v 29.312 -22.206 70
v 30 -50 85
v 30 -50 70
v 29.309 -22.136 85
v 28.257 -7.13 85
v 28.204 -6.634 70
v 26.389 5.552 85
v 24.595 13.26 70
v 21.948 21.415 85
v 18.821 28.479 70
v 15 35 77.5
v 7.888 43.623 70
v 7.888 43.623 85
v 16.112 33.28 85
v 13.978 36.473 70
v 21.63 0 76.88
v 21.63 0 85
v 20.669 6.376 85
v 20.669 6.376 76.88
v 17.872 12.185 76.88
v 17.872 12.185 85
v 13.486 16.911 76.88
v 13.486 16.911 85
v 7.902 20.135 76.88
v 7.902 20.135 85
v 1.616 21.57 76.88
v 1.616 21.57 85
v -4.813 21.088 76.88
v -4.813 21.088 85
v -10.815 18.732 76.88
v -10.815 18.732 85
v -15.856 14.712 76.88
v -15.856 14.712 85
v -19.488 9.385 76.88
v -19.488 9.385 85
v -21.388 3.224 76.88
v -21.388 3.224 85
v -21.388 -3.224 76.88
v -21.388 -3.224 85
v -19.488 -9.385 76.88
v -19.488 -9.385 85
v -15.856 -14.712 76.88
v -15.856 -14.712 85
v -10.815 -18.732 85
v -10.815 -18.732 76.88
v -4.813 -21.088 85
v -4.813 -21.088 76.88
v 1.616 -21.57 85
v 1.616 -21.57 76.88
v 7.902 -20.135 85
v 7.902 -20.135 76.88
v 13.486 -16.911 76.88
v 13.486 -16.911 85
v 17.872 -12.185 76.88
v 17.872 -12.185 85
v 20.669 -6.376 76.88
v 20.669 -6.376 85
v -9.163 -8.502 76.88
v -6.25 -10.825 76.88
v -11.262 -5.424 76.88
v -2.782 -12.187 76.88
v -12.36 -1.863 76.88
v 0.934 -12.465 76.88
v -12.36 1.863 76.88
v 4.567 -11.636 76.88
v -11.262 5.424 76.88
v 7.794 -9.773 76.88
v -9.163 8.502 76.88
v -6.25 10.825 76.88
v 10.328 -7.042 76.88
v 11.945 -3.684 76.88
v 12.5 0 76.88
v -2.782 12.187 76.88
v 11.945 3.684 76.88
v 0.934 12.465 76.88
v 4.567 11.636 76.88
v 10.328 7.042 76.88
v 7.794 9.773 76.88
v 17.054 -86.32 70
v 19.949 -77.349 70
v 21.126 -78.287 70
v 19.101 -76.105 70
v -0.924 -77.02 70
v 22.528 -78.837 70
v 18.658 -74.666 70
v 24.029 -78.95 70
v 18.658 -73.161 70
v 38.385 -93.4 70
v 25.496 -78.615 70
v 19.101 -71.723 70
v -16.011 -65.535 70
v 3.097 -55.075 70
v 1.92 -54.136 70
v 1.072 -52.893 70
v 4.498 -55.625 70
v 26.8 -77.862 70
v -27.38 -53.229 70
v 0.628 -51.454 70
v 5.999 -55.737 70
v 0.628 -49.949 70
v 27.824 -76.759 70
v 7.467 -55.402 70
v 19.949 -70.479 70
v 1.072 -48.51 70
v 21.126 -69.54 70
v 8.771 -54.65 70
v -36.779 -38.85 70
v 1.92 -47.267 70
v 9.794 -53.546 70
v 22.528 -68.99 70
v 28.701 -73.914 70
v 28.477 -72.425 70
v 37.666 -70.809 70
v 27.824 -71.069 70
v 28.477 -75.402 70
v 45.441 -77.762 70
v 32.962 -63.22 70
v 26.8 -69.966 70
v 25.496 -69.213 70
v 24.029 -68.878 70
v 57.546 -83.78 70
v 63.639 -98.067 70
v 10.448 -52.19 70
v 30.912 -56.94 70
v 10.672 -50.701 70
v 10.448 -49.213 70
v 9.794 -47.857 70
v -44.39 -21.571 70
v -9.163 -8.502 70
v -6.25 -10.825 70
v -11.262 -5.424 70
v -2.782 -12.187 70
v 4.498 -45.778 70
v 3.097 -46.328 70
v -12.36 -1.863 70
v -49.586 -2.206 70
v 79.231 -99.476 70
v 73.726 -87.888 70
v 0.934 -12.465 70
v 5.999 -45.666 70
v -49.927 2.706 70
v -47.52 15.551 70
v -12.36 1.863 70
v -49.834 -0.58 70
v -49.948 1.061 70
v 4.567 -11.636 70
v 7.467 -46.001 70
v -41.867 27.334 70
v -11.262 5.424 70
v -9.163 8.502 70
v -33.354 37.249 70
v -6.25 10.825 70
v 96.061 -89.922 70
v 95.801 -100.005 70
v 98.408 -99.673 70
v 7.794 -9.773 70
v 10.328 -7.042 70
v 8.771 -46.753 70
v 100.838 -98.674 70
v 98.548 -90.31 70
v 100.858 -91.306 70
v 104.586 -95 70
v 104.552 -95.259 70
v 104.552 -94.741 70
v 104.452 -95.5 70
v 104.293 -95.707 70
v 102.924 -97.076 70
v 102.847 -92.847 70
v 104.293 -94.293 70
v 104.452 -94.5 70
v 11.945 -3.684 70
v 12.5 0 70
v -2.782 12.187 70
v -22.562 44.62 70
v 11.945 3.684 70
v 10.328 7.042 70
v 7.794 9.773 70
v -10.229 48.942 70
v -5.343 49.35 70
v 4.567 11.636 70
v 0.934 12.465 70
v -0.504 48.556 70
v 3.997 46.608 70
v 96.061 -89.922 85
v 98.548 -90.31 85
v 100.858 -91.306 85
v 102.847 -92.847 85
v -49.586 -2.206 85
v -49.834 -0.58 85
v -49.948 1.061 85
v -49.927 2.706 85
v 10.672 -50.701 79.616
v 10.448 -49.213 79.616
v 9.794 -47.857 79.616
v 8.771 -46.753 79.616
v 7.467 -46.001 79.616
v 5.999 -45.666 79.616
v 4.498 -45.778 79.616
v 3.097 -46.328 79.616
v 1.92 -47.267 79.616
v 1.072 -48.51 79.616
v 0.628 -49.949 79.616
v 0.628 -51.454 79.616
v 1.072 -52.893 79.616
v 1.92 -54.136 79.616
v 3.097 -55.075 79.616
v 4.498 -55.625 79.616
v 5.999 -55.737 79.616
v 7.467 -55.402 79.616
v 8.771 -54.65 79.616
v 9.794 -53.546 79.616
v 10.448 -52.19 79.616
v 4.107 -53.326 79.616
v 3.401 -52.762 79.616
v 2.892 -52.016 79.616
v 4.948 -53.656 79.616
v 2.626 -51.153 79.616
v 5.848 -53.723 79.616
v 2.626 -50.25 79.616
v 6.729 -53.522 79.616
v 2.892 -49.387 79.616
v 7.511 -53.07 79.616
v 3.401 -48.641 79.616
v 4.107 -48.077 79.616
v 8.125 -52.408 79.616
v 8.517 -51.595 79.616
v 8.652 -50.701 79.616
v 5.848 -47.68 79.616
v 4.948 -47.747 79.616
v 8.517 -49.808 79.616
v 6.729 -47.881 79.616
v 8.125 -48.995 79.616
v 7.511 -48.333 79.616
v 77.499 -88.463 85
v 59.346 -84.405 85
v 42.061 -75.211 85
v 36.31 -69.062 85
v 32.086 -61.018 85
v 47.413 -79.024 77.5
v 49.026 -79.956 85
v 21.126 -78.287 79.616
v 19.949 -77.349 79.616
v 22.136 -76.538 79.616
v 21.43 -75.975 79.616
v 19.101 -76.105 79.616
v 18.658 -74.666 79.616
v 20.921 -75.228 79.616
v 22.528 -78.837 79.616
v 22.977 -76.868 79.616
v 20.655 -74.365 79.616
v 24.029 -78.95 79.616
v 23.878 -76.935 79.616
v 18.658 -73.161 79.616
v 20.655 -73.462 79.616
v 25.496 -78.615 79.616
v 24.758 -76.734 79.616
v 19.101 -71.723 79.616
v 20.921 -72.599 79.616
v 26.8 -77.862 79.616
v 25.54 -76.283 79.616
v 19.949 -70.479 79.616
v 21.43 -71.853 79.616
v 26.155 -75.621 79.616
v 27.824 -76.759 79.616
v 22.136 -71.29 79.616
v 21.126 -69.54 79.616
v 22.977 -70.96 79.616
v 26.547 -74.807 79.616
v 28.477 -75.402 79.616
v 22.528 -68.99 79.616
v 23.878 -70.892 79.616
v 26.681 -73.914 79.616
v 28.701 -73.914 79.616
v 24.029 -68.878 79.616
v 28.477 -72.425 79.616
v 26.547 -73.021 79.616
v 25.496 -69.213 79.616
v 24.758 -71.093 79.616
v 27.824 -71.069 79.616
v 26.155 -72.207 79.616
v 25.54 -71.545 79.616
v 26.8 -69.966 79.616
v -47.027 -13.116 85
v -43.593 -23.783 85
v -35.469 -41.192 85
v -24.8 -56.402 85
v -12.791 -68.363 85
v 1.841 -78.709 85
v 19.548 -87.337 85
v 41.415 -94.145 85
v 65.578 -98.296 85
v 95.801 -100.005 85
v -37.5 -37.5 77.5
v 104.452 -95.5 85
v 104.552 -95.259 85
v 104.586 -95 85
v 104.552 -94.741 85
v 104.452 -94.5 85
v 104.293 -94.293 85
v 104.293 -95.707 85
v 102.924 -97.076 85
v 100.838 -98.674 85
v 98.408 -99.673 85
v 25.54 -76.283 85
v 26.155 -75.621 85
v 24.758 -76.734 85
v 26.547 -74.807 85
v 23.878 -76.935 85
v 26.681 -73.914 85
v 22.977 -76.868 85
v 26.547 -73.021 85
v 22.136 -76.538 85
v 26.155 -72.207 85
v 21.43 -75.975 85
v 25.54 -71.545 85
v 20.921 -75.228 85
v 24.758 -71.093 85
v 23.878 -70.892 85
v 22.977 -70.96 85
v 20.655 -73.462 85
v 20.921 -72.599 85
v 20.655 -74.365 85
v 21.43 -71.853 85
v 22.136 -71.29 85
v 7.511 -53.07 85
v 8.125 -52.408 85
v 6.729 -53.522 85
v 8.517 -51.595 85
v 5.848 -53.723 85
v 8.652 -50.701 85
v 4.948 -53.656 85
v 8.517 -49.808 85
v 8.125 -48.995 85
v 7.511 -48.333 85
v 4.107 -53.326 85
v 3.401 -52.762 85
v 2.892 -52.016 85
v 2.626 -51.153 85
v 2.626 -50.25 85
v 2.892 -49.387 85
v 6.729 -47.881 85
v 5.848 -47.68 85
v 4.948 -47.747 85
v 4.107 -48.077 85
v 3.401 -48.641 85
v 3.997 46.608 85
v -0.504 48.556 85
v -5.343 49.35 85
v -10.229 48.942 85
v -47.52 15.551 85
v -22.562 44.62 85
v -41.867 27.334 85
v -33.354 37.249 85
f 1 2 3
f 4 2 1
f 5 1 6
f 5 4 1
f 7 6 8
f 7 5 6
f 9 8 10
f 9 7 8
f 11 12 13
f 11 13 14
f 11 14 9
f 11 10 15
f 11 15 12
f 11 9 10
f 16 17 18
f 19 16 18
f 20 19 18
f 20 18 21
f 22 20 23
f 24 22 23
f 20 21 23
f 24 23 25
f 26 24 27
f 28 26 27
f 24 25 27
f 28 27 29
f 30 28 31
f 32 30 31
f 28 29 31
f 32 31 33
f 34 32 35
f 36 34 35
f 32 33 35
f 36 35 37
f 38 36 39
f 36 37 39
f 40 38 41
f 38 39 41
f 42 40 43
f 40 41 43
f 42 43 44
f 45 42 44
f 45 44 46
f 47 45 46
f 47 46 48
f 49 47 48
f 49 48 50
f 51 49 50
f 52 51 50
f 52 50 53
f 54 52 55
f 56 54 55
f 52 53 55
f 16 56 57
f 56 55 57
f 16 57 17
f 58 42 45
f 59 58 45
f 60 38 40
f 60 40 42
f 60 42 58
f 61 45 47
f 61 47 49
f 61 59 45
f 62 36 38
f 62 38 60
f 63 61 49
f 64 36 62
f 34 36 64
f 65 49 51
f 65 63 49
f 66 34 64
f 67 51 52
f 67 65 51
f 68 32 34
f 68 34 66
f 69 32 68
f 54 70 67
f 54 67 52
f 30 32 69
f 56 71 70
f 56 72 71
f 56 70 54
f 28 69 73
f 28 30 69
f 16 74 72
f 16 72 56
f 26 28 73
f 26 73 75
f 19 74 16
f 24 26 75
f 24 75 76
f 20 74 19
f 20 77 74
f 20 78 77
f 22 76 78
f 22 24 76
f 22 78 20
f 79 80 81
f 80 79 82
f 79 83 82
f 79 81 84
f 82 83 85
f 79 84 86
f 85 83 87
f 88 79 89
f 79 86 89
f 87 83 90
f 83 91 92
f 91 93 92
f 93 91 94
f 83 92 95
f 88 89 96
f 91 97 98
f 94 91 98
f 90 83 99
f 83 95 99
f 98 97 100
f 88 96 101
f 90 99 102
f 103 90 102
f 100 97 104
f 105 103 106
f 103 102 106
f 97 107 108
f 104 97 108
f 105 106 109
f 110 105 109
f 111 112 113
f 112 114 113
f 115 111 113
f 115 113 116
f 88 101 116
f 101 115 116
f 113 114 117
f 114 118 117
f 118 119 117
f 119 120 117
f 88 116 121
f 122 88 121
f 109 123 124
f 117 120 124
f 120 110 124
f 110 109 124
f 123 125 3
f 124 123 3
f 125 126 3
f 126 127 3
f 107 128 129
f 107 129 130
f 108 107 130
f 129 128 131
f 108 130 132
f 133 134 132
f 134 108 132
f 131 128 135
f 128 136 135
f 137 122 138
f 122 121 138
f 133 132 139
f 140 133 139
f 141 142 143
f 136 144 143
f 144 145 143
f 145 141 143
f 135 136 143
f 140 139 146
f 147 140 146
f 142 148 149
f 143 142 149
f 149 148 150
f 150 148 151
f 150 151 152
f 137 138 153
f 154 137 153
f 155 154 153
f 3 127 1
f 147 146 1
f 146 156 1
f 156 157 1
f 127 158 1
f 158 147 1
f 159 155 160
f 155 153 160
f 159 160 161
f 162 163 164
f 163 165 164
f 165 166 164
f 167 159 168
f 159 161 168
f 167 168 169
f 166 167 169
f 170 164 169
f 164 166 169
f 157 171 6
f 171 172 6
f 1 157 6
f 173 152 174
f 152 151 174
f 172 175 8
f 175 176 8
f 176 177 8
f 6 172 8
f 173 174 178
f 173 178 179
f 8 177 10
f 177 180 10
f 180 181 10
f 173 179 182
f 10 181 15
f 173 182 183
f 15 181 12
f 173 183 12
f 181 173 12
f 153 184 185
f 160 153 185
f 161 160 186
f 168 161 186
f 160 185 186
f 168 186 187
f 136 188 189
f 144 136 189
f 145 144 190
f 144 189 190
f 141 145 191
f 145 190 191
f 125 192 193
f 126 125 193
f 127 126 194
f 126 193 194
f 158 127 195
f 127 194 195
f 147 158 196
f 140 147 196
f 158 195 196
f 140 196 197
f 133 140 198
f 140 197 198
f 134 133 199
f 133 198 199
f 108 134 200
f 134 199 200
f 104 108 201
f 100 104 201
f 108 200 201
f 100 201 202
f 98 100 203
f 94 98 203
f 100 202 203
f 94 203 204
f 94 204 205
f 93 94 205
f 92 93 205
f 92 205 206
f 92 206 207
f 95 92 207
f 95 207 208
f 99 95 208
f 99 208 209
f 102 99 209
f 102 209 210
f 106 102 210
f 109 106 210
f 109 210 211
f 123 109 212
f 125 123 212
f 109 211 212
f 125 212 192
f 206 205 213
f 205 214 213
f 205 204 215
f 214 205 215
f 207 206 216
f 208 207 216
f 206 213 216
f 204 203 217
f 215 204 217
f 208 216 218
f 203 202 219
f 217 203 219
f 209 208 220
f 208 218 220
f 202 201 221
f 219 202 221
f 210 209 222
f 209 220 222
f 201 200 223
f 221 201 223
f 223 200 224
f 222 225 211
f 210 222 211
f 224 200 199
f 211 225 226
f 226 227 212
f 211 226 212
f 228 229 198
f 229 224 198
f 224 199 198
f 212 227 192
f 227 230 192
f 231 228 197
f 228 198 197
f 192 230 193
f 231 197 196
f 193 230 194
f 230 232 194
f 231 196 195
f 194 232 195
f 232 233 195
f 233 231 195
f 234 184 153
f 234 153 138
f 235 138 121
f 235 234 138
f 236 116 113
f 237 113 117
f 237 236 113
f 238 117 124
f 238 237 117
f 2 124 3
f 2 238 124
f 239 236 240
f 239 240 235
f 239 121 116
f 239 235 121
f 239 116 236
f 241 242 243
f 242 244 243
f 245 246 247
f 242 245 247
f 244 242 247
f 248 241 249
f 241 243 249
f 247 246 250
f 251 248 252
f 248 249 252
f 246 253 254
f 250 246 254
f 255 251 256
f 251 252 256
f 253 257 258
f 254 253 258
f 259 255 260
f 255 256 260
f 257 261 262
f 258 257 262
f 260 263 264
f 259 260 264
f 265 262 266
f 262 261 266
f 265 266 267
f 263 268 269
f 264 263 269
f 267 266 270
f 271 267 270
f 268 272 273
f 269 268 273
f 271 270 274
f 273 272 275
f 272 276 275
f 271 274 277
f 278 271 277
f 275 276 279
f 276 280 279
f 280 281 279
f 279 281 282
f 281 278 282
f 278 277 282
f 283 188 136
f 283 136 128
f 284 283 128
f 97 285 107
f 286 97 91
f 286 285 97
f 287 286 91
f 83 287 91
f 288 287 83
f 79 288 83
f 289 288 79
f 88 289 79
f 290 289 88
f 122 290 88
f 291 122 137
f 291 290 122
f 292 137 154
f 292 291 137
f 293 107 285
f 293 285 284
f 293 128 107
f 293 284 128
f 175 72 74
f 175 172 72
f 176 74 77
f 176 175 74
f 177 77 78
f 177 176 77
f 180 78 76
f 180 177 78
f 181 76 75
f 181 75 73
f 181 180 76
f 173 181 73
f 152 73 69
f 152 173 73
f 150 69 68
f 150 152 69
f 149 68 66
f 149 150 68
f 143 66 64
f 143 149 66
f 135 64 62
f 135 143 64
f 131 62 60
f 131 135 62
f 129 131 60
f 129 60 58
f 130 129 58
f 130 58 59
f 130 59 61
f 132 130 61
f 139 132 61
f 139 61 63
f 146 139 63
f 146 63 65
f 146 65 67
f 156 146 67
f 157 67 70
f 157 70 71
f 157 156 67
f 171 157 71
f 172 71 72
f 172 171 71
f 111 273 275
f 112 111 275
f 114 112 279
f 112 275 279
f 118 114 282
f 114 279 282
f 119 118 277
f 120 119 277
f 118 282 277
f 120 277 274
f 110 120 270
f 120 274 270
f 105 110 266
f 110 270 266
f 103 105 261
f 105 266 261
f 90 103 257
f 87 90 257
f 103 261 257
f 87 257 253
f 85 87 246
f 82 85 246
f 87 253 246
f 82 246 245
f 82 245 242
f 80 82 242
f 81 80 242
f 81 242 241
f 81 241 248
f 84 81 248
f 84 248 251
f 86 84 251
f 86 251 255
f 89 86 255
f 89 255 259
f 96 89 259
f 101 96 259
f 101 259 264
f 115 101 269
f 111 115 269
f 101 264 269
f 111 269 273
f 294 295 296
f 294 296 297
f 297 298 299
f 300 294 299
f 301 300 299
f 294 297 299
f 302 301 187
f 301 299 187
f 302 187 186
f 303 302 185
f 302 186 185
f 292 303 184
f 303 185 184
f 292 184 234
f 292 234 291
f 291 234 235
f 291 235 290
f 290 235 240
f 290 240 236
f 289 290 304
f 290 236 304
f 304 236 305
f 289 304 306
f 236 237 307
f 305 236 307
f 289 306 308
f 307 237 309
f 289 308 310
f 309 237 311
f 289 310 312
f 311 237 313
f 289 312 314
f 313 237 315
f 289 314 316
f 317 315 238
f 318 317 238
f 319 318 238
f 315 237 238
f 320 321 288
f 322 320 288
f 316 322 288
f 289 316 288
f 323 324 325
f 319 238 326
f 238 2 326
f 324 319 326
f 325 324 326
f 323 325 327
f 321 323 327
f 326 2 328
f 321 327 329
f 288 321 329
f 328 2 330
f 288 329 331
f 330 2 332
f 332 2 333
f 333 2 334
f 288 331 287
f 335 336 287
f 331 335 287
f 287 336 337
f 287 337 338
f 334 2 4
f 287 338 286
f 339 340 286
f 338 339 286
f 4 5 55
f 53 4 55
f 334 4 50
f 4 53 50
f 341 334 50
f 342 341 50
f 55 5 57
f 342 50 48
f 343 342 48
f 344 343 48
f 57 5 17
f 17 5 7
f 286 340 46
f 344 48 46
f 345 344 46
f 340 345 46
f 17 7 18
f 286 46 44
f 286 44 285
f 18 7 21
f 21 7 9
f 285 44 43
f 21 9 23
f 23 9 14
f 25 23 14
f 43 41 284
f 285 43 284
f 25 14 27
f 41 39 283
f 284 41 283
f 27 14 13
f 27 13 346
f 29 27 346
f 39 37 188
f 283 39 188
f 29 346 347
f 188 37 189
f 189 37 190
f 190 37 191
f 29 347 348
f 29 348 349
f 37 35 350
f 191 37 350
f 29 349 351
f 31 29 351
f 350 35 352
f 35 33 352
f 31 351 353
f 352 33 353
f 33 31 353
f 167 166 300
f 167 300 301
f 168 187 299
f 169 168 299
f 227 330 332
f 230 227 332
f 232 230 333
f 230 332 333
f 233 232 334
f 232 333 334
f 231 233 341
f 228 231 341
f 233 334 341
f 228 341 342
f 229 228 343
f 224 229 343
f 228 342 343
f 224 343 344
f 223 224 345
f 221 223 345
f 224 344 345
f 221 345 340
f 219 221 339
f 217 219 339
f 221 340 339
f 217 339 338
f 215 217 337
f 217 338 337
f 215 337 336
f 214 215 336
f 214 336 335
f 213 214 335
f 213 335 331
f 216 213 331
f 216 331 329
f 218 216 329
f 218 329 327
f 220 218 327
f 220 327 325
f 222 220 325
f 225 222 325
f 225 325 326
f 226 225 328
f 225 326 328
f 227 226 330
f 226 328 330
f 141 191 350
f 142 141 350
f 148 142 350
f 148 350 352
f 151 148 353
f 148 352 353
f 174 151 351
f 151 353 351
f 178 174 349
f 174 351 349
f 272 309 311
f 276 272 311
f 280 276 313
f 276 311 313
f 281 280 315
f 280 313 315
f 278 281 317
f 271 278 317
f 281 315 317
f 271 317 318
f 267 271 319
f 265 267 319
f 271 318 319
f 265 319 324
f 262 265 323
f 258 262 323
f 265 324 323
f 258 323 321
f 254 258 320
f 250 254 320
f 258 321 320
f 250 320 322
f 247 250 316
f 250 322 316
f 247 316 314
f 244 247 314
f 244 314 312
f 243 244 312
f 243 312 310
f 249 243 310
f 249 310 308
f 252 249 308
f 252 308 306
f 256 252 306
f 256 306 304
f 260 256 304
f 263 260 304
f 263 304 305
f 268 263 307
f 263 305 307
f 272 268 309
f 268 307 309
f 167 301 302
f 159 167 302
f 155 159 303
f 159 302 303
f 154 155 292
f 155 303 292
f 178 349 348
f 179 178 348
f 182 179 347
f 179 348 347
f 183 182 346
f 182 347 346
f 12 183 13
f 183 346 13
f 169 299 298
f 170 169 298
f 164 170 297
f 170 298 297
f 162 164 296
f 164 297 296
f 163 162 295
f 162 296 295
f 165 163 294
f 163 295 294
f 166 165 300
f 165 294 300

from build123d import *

# Parameters (mm, degrees)
CROQUIS1_R              = 10
SALIENTE_EXTRUIR1_DEPTH = 100
CORTAR_EXTRUIR4_DEPTH   = 15
CROQUIS3_W              = 244.799963401
CROQUIS3_H              = 159.784694376
CORTAR_EXTRUIR5_DEPTH   = 35
CROQUIS4_W              = 177.681228393
CROQUIS4_H              = 202.290816813
CORTAR_EXTRUIR6_DEPTH   = 50
CAVIDAD1_START          = 90.384084462
CAVIDAD1_OUTLINE_R      = 5.05
CAVIDAD1_DEPTH          = 9.615915538
CAVIDAD1_START_2        = 85
CAVIDAD1_2_OUTLINE_R    = 3.03
CAVIDAD1_2_DEPTH        = 5.384084462
CROQUIS5_R              = 21
CORTAR_EXTRUIR7_DEPTH   = 8
CROQUIS6_R              = 12.5
CORTAR_EXTRUIR8_DEPTH   = 8
SALIENTE_EXTRUIR2_START = 8
CROQUIS7_R              = 21
CROQUIS7_R_2            = 12.5
SALIENTE_EXTRUIR2_DEPTH = 8
CROQUIS8_R              = 21
CORTAR_EXTRUIR9_DEPTH   = 8
CAVIDAD2_START          = 85
CAVIDAD2_OUTLINE_R      = 21.63
CAVIDAD2_DEPTH          = 8.12


# Read off the part's stored shape, not the designer's step: Cavidad1, Cavidad2
with BuildPart() as part:
    # Croquis1 → Saliente-Extruir1 (new body)
    with BuildSketch(Plane.XY):
        with BuildLine():
            Line((102.84709295, -92.84709295), (104.292893219, -94.292893219))
            ThreePointArc((104.292893219, -94.292893219), (104.585786438, -95), (104.292893219, -95.707106781))
            Line((104.292893219, -95.707106781), (102.924090823, -97.075909177))
            ThreePointArc((102.924090823, -97.075909177), (99.655924863, -99.253513567), (95.801242309, -100.004707302))
            add(Edge.make_bspline(
                [(-49.58600728, -2.205776949), (-47.044709507, -15.23286343), (-27.045253615, -73.563310407), (28.636670051, -99.656919769), (95.801242309, -100.004707302)],
                knots=[0.011039812, 0.011039812, 0.011039812, 0.011039812, 0.207725041, 0.983937689, 0.983937689, 0.983937689, 0.983937689], degree=3))
            ThreePointArc((-49.58600728, -2.205776949), (-49.90808847, 0.239585929), (-49.92672205, 2.705998037))
            ThreePointArc((-49.92672205, 2.705998037), (-37.935964584, 32.570885635), (-10.229250857, 48.942439936))
            ThreePointArc((-10.229250857, 48.942439936), (-0.503550938, 48.555514737), (7.88775097, 43.623476385))
            add(Edge.make_bspline(
                [(30, -50), (29.065577858, -23.91659264), (31.451883129, 15.353668912), (10.5535399, 41.001196903), (7.88775097, 43.623476385)],
                knots=[0, 0, 0, 0, 0.805376889, 0.908560603, 0.908560603, 0.908560603, 0.908560603], degree=3))
            add(Edge.make_bspline(
                [(96.061432126, -89.922234449), (74.639632489, -89.310592156), (42.207594165, -82.045244121), (30.598677739, -62.69576919), (30, -50)],
                knots=[0.027764728, 0.027764728, 0.027764728, 0.027764728, 0.487449894, 0.947135059, 0.947135059, 0.947135059, 0.947135059], degree=3))
            ThreePointArc((96.061432126, -89.922234449), (99.734323975, -90.734922209), (102.84709295, -92.84709295))
        make_face()
        Circle(CROQUIS1_R, mode=Mode.SUBTRACT)
    extrude(amount=SALIENTE_EXTRUIR1_DEPTH)

    # Croquis2 → Cortar-Extruir4 (cut)
    with BuildSketch(Plane(origin=(0, 0, 0), x_dir=(-1, 0, 0), z_dir=(0, 0, -1))):
        with BuildLine():
            ThreePointArc((1.102623365, 39.984799883), (1.653330869, 39.965816607), (2.203724614, 39.939248839))
            ThreePointArc((2.203724614, 39.939248839), (3.208029629, 37.678468026), (3.853201686, 35.290265468))
            ThreePointArc((3.853201686, 35.290265468), (4.391380959, 35.227344113), (4.928537187, 35.156215968))
            ThreePointArc((4.928537187, 35.156215968), (6.140272041, 37.312939662), (7.668866774, 39.257973488))
            ThreePointArc((7.668866774, 39.257973488), (8.208938801, 39.148605643), (8.747452981, 39.031808392))
            ThreePointArc((8.747452981, 39.031808392), (9.365948293, 36.63655851), (9.609235823, 34.174736091))
            ThreePointArc((9.609235823, 34.174736091), (10.129718517, 34.024091505), (10.647841327, 33.865520446))
            ThreePointArc((10.647841327, 33.865520446), (12.198034749, 35.793384238), (14.025923488, 37.460291914))
            ThreePointArc((14.025923488, 37.460291914), (14.540628281, 37.263522769), (15.052573634, 37.05968196))
            ThreePointArc((15.052573634, 37.05968196), (15.268388303, 34.595299183), (15.103155055, 32.127009001))
            ThreePointArc((15.103155055, 32.127009001), (15.591743761, 31.892750375), (16.076700112, 31.651061807))
            ThreePointArc((16.076700112, 31.651061807), (17.923066867, 33.297478598), (20.000389573, 34.640791229))
            ThreePointArc((20.000389573, 34.640791229), (20.475687326, 34.361988134), (20.947099317, 34.076664012))
            ThreePointArc((20.947099317, 34.076664012), (20.754346482, 31.610370276), (20.18509959, 29.202940855))
            ThreePointArc((20.18509959, 29.202940855), (20.628466879, 28.891458153), (21.067028427, 28.57324471))
            ThreePointArc((21.067028427, 28.57324471), (23.159204443, 29.893304542), (25.429297167, 30.87638006))
            ThreePointArc((25.429297167, 30.87638006), (25.852222997, 30.523148037), (26.270242736, 30.164123501))
            ThreePointArc((26.270242736, 30.164123501), (25.674180192, 27.763192871), (24.716447225, 25.482292608))
            ThreePointArc((24.716447225, 25.482292608), (25.102499195, 25.102082267), (25.482703124, 24.716023982))
            ThreePointArc((25.482703124, 24.716023982), (27.763619294, 25.673719065), (30.164559823, 26.269741732))
            ThreePointArc((30.164559823, 26.269741732), (30.523577417, 25.85171603), (30.876802415, 25.428784332))
            ThreePointArc((30.876802415, 25.428784332), (29.893689193, 23.158707937), (28.573594612, 21.066553846))
            ThreePointArc((28.573594612, 21.066553846), (28.891800771, 20.627987013), (29.203276108, 20.18461455))
            ThreePointArc((29.203276108, 20.18461455), (31.610714984, 20.753821458), (34.077011921, 20.94653333))
            ThreePointArc((34.077011921, 20.94653333), (34.362328213, 20.4751166), (34.641123413, 19.999814215))
            ThreePointArc((34.641123413, 19.999814215), (33.297776281, 17.922513822), (31.651328823, 16.076174412))
            ThreePointArc((31.651328823, 16.076174412), (31.893009337, 15.591214047), (32.127259848, 15.102621451))
            ThreePointArc((32.127259848, 15.102621451), (34.595552773, 15.267813702), (37.059931966, 15.051958102))
            ThreePointArc((37.059931966, 15.051958102), (37.263764272, 14.540009363), (37.460524868, 14.025301302))
            ThreePointArc((37.460524868, 14.025301302), (35.793586832, 12.197440249), (33.865697293, 10.647278847))
            ThreePointArc((33.865697293, 10.647278847), (34.024259747, 10.129153404), (34.174895688, 9.608668207))
            ThreePointArc((34.174895688, 9.608668207), (36.636714066, 9.365339789), (39.031953674, 8.746804694))
            ThreePointArc((39.031953674, 8.746804694), (39.148741981, 8.208288574), (39.258100856, 7.668214731))
            ThreePointArc((39.258100856, 7.668214731), (37.313041641, 6.139652303), (35.156297822, 4.927953271))
            ThreePointArc((35.156297822, 4.927953271), (35.227417046, 4.390795861), (35.290329461, 3.852615543))
            ThreePointArc((35.290329461, 3.852615543), (37.678521304, 3.20740382), (39.939285436, 2.203061256))
            ThreePointArc((39.939285436, 2.203061256), (39.965844062, 1.65266707), (39.984818192, 1.101959251))
            ThreePointArc((39.984818192, 1.101959251), (37.814693942, -0.085609353), (35.487926192, -0.925794025))
            ThreePointArc((35.487926192, -0.925794025), (35.469662238, -1.467331147), (35.443135042, -2.00852643))
            ThreePointArc((35.443135042, -2.00852643), (37.692556701, -3.038021764), (39.757177604, -4.400775951))
            ThreePointArc((39.757177604, -4.400775951), (39.692782099, -4.948034883), (39.620853919, -5.494354805))
            ThreePointArc((39.620853919, -5.494354805), (37.284859968, -6.308535809), (34.851536446, -6.754288072))
            ThreePointArc((34.851536446, -6.754288072), (34.744387508, -7.285433186), (34.629144292, -7.814881038))
            ThreePointArc((34.629144292, -7.814881038), (36.678437409, -9.200578033), (38.490597607, -10.884571461))
            ThreePointArc((38.490597607, -10.884571461), (38.337004513, -11.413767343), (38.176136036, -11.940797184))
            ThreePointArc((38.176136036, -11.940797184), (35.737992209, -12.359381853), (33.264487636, -12.398542748))
            ThreePointArc((33.264487636, -12.398542748), (33.071376458, -12.904807599), (32.870560757, -13.408066063))
            ThreePointArc((32.870560757, -13.408066063), (34.663825958, -15.112166519), (36.174094444, -17.071464236))
            ThreePointArc((36.174094444, -17.071464236), (35.935493381, -17.568161984), (35.690072679, -18.061525743))
            ThreePointArc((35.690072679, -18.061525743), (33.216285184, -18.073096179), (30.770070318, -17.704597499))
            ThreePointArc((30.770070318, -17.704597499), (30.496264469, -18.172172502), (30.215354012, -18.635513998))
            ThreePointArc((30.215354012, -18.635513998), (31.703675696, -20.611534496), (32.870856284, -22.792691969))
            ThreePointArc((32.870856284, -22.792691969), (32.553755666, -23.243342962), (32.230477177, -23.689582963))
            ThreePointArc((32.230477177, -23.689582963), (29.788524487, -23.293823554), (27.436325694, -22.527716982))
            ThreePointArc((27.436325694, -22.527716982), (27.089293883, -22.94384791), (26.735951175, -23.35463369))
            ThreePointArc((26.735951175, -23.35463369), (27.878731807, -25.548673542), (28.670986852, -27.89219448))
            ThreePointArc((28.670986852, -27.89219448), (28.284036357, -28.284506136), (27.891718275, -28.671450114))
            ThreePointArc((27.891718275, -28.671450114), (25.548210496, -27.879156145), (23.354189625, -26.736339072))
            ThreePointArc((23.354189625, -26.736339072), (22.943397976, -27.089674957), (22.527261285, -27.436699856))
            ThreePointArc((22.527261285, -27.436699856), (23.293328789, -29.788911374), (23.689047639, -32.230870636))
            ThreePointArc((23.689047639, -32.230870636), (23.242802268, -32.554141714), (22.792146008, -32.871234847))
            ThreePointArc((22.792146008, -32.871234847), (20.611007921, -31.704018032), (18.635012143, -30.215663528))
            ThreePointArc((18.635012143, -30.215663528), (18.171665982, -30.496566289), (17.704086432, -30.770364373))
            ThreePointArc((17.704086432, -30.770364373), (18.072544482, -33.216585358), (18.060932958, -35.690372661))
            ThreePointArc((18.060932958, -35.690372661), (17.567565123, -35.935785168), (17.070863412, -36.174377982))
            ThreePointArc((17.070863412, -36.174377982), (15.111590779, -34.664076954), (13.407520108, -32.870783449))
            ThreePointArc((13.407520108, -32.870783449), (12.90425831, -33.071590791), (12.397990251, -33.264693561))
            ThreePointArc((12.397990251, -33.264693561), (12.358788274, -35.738197483), (11.940163108, -38.176334357))
            ThreePointArc((11.940163108, -38.176334357), (11.413130596, -38.337194081), (10.883932163, -38.490778385))
            ThreePointArc((10.883932163, -38.490778385), (9.199968834, -36.678590218), (7.814305875, -34.629274085))
            ThreePointArc((7.814305875, -34.629274085), (7.28485611, -34.744508508), (6.753709216, -34.851648624))
            ThreePointArc((6.753709216, -34.851648624), (6.307916538, -37.284964743), (5.493696735, -39.62094517))
            ThreePointArc((5.493696735, -39.62094517), (4.947375618, -39.692864277), (4.400115616, -39.757250692))
            ThreePointArc((4.400115616, -39.757250692), (3.037395721, -37.692607155), (2.007937749, -35.443168397))
            ThreePointArc((2.007937749, -35.443168397), (1.466742025, -35.469686605), (0.9252046, -35.487941564))
            ThreePointArc((0.9252046, -35.487941564), (0.084981283, -37.814695359), (-1.102623365, -39.984799883))
            ThreePointArc((-1.102623365, -39.984799883), (-1.653330869, -39.965816607), (-2.203724614, -39.939248839))
            ThreePointArc((-2.203724614, -39.939248839), (-3.208029629, -37.678468026), (-3.853201686, -35.290265468))
            ThreePointArc((-3.853201686, -35.290265468), (-4.391380959, -35.227344113), (-4.928537187, -35.156215968))
            ThreePointArc((-4.928537187, -35.156215968), (-6.140272041, -37.312939662), (-7.668866774, -39.257973488))
            ThreePointArc((-7.668866774, -39.257973488), (-8.208938801, -39.148605643), (-8.747452981, -39.031808392))
            ThreePointArc((-8.747452981, -39.031808392), (-9.365948293, -36.63655851), (-9.609235823, -34.174736091))
            ThreePointArc((-9.609235823, -34.174736091), (-10.129718517, -34.024091505), (-10.647841327, -33.865520446))
            ThreePointArc((-10.647841327, -33.865520446), (-12.198034749, -35.793384238), (-14.025923488, -37.460291914))
            ThreePointArc((-14.025923488, -37.460291914), (-14.540628281, -37.263522769), (-15.052573634, -37.05968196))
            ThreePointArc((-15.052573634, -37.05968196), (-15.268388303, -34.595299183), (-15.103155055, -32.127009001))
            ThreePointArc((-15.103155055, -32.127009001), (-15.591743761, -31.892750375), (-16.076700112, -31.651061807))
            ThreePointArc((-16.076700112, -31.651061807), (-17.923066867, -33.297478598), (-20.000389573, -34.640791229))
            ThreePointArc((-20.000389573, -34.640791229), (-20.475687326, -34.361988134), (-20.947099317, -34.076664012))
            ThreePointArc((-20.947099317, -34.076664012), (-20.754346482, -31.610370276), (-20.18509959, -29.202940855))
            ThreePointArc((-20.18509959, -29.202940855), (-20.628466879, -28.891458153), (-21.067028427, -28.57324471))
            ThreePointArc((-21.067028427, -28.57324471), (-23.159204443, -29.893304542), (-25.429297167, -30.87638006))
            ThreePointArc((-25.429297167, -30.87638006), (-25.852222997, -30.523148037), (-26.270242736, -30.164123501))
            ThreePointArc((-26.270242736, -30.164123501), (-25.674180192, -27.763192871), (-24.716447225, -25.482292608))
            ThreePointArc((-24.716447225, -25.482292608), (-25.102499195, -25.102082267), (-25.482703124, -24.716023982))
            ThreePointArc((-25.482703124, -24.716023982), (-27.421409872, -25.555856409), (-29.453588357, -26.133916065))
            add(Edge.make_bspline(
                [(-30, -50), (-29.734872846, -42.599255467), (-29.715262914, -34.495945215), (-29.453588357, -26.133916065)],
                knots=[0, 0, 0, 0, 0.228512653, 0.228512653, 0.228512653, 0.228512653], degree=3))
            add(Edge.make_bspline(
                [(-96.061432126, -89.922234449), (-74.639632489, -89.310592156), (-42.207594165, -82.045244121), (-30.598677739, -62.69576919), (-30, -50)],
                knots=[0.027764728, 0.027764728, 0.027764728, 0.027764728, 0.487449894, 0.947135059, 0.947135059, 0.947135059, 0.947135059], degree=3))
            ThreePointArc((-96.061432126, -89.922234449), (-99.734323975, -90.734922209), (-102.84709295, -92.84709295))
            Line((-102.84709295, -92.84709295), (-104.292893219, -94.292893219))
            ThreePointArc((-104.292893219, -94.292893219), (-104.585786438, -95), (-104.292893219, -95.707106781))
            Line((-104.292893219, -95.707106781), (-102.924090823, -97.075909177))
            ThreePointArc((-102.924090823, -97.075909177), (-99.655924863, -99.253513567), (-95.801242309, -100.004707302))
            add(Edge.make_bspline(
                [(49.58600728, -2.205776949), (47.044709507, -15.23286343), (27.045253615, -73.563310407), (-28.636670051, -99.656919769), (-95.801242309, -100.004707302)],
                knots=[0.011039812, 0.011039812, 0.011039812, 0.011039812, 0.207725041, 0.983937689, 0.983937689, 0.983937689, 0.983937689], degree=3))
            ThreePointArc((49.58600728, -2.205776949), (49.90808847, 0.239585929), (49.92672205, 2.705998037))
            ThreePointArc((49.92672205, 2.705998037), (37.935964584, 32.570885635), (10.229250857, 48.942439936))
            ThreePointArc((10.229250857, 48.942439936), (0.503550938, 48.555514737), (-7.88775097, 43.623476385))
            add(Edge.make_bspline(
                [(-15.182020199, 34.727214957), (-15.121605489, 34.818294405), (-12.99668952, 38.002837294), (-10.5535399, 41.001196903), (-7.88775097, 43.623476385)],
                knots=[0.802344073, 0.802344073, 0.802344073, 0.802344073, 0.805376889, 0.908560603, 0.908560603, 0.908560603, 0.908560603], degree=3))
            ThreePointArc((-15.182020199, 34.727214957), (-14.257602386, 33.834526615), (-13.407520108, 32.870783449))
            ThreePointArc((-13.407520108, 32.870783449), (-12.90425831, 33.071590791), (-12.397990251, 33.264693561))
            ThreePointArc((-12.397990251, 33.264693561), (-12.358788274, 35.738197483), (-11.940163108, 38.176334357))
            ThreePointArc((-11.940163108, 38.176334357), (-11.413130596, 38.337194081), (-10.883932163, 38.490778385))
            ThreePointArc((-10.883932163, 38.490778385), (-9.199968834, 36.678590218), (-7.814305875, 34.629274085))
            ThreePointArc((-7.814305875, 34.629274085), (-7.28485611, 34.744508508), (-6.753709216, 34.851648624))
            ThreePointArc((-6.753709216, 34.851648624), (-6.307916538, 37.284964743), (-5.493696735, 39.62094517))
            ThreePointArc((-5.493696735, 39.62094517), (-4.947375618, 39.692864277), (-4.400115616, 39.757250692))
            ThreePointArc((-4.400115616, 39.757250692), (-3.037395721, 37.692607155), (-2.007937749, 35.443168397))
            ThreePointArc((-2.007937749, 35.443168397), (-1.466742025, 35.469686605), (-0.9252046, 35.487941564))
            ThreePointArc((-0.9252046, 35.487941564), (-0.084981283, 37.814695359), (1.102623365, 39.984799883))
        make_face()
    extrude(amount=-CORTAR_EXTRUIR4_DEPTH, mode=Mode.SUBTRACT)

    # Croquis3 → Cortar-Extruir5 (cut)
    with BuildSketch(Plane(origin=(0, 0, 0), x_dir=(-1, 0, 0), z_dir=(0, 0, -1))):
        with Locations((-26.261343778, -29.231181028)):
            Rectangle(CROQUIS3_W, CROQUIS3_H)
    extrude(amount=-CORTAR_EXTRUIR5_DEPTH, mode=Mode.SUBTRACT)

    # Croquis4 → Cortar-Extruir6 (cut)
    with BuildSketch(Plane(origin=(0, 0, 35), x_dir=(-1, 0, 0), z_dir=(0, 0, -1))):
        with Locations((-31.414152083, -26.798932517)):
            Rectangle(CROQUIS4_W, CROQUIS4_H)
    extrude(amount=-CORTAR_EXTRUIR6_DEPTH, mode=Mode.SUBTRACT)

    # Cavidad1 outline → Cavidad1 (cut)
    with BuildSketch(Plane.XY.offset(CAVIDAD1_START)):
        with Locations((5.62196341, -50.701498074)):
            Circle(CAVIDAD1_OUTLINE_R)
        with Locations((23.651318082, -73.91381178)):
            Circle(CAVIDAD1_OUTLINE_R)
    extrude(amount=CAVIDAD1_DEPTH, mode=Mode.SUBTRACT)

    # Cavidad1 2 outline → Cavidad1 2 (cut)
    with BuildSketch(Plane.XY.offset(CAVIDAD1_START_2)):
        with Locations((5.62196341, -50.701498074)):
            Circle(CAVIDAD1_2_OUTLINE_R)
        with Locations((23.651318082, -73.91381178)):
            Circle(CAVIDAD1_2_OUTLINE_R)
    extrude(amount=CAVIDAD1_2_DEPTH, mode=Mode.SUBTRACT)

    # Croquis5 → Cortar-Extruir7 (cut)
    with BuildSketch(Plane.XY.offset(100)):
        Circle(CROQUIS5_R)
    extrude(amount=-CORTAR_EXTRUIR7_DEPTH, mode=Mode.SUBTRACT)

    # Croquis6 → Cortar-Extruir8 (cut)
    with BuildSketch(Plane.XY.offset(92)):
        Circle(CROQUIS6_R)
    extrude(amount=-CORTAR_EXTRUIR8_DEPTH, mode=Mode.SUBTRACT)

    # Croquis7 → Saliente-Extruir2 (add)
    with BuildSketch(Plane.XY.offset(92).offset(SALIENTE_EXTRUIR2_START)):
        Circle(CROQUIS7_R)
        Circle(CROQUIS7_R_2, mode=Mode.SUBTRACT)
    extrude(amount=-SALIENTE_EXTRUIR2_DEPTH)

    # Croquis8 → Cortar-Extruir9 (cut)
    with BuildSketch(Plane(origin=(0, 0, 85), x_dir=(-1, 0, 0), z_dir=(0, 0, -1))):
        Circle(CROQUIS8_R)
    extrude(amount=-CORTAR_EXTRUIR9_DEPTH, mode=Mode.SUBTRACT)

    # Cavidad2 outline → Cavidad2 (cut)
    with BuildSketch(Plane.XY.offset(CAVIDAD2_START)):
        Circle(CAVIDAD2_OUTLINE_R)
    extrude(amount=CAVIDAD2_DEPTH, mode=Mode.SUBTRACT)


with BuildPart() as body_2:
    # Simetría1: mirrored copy
    add(part.part.mirror(Plane.XY.offset(85)))


solid = body_2.part
